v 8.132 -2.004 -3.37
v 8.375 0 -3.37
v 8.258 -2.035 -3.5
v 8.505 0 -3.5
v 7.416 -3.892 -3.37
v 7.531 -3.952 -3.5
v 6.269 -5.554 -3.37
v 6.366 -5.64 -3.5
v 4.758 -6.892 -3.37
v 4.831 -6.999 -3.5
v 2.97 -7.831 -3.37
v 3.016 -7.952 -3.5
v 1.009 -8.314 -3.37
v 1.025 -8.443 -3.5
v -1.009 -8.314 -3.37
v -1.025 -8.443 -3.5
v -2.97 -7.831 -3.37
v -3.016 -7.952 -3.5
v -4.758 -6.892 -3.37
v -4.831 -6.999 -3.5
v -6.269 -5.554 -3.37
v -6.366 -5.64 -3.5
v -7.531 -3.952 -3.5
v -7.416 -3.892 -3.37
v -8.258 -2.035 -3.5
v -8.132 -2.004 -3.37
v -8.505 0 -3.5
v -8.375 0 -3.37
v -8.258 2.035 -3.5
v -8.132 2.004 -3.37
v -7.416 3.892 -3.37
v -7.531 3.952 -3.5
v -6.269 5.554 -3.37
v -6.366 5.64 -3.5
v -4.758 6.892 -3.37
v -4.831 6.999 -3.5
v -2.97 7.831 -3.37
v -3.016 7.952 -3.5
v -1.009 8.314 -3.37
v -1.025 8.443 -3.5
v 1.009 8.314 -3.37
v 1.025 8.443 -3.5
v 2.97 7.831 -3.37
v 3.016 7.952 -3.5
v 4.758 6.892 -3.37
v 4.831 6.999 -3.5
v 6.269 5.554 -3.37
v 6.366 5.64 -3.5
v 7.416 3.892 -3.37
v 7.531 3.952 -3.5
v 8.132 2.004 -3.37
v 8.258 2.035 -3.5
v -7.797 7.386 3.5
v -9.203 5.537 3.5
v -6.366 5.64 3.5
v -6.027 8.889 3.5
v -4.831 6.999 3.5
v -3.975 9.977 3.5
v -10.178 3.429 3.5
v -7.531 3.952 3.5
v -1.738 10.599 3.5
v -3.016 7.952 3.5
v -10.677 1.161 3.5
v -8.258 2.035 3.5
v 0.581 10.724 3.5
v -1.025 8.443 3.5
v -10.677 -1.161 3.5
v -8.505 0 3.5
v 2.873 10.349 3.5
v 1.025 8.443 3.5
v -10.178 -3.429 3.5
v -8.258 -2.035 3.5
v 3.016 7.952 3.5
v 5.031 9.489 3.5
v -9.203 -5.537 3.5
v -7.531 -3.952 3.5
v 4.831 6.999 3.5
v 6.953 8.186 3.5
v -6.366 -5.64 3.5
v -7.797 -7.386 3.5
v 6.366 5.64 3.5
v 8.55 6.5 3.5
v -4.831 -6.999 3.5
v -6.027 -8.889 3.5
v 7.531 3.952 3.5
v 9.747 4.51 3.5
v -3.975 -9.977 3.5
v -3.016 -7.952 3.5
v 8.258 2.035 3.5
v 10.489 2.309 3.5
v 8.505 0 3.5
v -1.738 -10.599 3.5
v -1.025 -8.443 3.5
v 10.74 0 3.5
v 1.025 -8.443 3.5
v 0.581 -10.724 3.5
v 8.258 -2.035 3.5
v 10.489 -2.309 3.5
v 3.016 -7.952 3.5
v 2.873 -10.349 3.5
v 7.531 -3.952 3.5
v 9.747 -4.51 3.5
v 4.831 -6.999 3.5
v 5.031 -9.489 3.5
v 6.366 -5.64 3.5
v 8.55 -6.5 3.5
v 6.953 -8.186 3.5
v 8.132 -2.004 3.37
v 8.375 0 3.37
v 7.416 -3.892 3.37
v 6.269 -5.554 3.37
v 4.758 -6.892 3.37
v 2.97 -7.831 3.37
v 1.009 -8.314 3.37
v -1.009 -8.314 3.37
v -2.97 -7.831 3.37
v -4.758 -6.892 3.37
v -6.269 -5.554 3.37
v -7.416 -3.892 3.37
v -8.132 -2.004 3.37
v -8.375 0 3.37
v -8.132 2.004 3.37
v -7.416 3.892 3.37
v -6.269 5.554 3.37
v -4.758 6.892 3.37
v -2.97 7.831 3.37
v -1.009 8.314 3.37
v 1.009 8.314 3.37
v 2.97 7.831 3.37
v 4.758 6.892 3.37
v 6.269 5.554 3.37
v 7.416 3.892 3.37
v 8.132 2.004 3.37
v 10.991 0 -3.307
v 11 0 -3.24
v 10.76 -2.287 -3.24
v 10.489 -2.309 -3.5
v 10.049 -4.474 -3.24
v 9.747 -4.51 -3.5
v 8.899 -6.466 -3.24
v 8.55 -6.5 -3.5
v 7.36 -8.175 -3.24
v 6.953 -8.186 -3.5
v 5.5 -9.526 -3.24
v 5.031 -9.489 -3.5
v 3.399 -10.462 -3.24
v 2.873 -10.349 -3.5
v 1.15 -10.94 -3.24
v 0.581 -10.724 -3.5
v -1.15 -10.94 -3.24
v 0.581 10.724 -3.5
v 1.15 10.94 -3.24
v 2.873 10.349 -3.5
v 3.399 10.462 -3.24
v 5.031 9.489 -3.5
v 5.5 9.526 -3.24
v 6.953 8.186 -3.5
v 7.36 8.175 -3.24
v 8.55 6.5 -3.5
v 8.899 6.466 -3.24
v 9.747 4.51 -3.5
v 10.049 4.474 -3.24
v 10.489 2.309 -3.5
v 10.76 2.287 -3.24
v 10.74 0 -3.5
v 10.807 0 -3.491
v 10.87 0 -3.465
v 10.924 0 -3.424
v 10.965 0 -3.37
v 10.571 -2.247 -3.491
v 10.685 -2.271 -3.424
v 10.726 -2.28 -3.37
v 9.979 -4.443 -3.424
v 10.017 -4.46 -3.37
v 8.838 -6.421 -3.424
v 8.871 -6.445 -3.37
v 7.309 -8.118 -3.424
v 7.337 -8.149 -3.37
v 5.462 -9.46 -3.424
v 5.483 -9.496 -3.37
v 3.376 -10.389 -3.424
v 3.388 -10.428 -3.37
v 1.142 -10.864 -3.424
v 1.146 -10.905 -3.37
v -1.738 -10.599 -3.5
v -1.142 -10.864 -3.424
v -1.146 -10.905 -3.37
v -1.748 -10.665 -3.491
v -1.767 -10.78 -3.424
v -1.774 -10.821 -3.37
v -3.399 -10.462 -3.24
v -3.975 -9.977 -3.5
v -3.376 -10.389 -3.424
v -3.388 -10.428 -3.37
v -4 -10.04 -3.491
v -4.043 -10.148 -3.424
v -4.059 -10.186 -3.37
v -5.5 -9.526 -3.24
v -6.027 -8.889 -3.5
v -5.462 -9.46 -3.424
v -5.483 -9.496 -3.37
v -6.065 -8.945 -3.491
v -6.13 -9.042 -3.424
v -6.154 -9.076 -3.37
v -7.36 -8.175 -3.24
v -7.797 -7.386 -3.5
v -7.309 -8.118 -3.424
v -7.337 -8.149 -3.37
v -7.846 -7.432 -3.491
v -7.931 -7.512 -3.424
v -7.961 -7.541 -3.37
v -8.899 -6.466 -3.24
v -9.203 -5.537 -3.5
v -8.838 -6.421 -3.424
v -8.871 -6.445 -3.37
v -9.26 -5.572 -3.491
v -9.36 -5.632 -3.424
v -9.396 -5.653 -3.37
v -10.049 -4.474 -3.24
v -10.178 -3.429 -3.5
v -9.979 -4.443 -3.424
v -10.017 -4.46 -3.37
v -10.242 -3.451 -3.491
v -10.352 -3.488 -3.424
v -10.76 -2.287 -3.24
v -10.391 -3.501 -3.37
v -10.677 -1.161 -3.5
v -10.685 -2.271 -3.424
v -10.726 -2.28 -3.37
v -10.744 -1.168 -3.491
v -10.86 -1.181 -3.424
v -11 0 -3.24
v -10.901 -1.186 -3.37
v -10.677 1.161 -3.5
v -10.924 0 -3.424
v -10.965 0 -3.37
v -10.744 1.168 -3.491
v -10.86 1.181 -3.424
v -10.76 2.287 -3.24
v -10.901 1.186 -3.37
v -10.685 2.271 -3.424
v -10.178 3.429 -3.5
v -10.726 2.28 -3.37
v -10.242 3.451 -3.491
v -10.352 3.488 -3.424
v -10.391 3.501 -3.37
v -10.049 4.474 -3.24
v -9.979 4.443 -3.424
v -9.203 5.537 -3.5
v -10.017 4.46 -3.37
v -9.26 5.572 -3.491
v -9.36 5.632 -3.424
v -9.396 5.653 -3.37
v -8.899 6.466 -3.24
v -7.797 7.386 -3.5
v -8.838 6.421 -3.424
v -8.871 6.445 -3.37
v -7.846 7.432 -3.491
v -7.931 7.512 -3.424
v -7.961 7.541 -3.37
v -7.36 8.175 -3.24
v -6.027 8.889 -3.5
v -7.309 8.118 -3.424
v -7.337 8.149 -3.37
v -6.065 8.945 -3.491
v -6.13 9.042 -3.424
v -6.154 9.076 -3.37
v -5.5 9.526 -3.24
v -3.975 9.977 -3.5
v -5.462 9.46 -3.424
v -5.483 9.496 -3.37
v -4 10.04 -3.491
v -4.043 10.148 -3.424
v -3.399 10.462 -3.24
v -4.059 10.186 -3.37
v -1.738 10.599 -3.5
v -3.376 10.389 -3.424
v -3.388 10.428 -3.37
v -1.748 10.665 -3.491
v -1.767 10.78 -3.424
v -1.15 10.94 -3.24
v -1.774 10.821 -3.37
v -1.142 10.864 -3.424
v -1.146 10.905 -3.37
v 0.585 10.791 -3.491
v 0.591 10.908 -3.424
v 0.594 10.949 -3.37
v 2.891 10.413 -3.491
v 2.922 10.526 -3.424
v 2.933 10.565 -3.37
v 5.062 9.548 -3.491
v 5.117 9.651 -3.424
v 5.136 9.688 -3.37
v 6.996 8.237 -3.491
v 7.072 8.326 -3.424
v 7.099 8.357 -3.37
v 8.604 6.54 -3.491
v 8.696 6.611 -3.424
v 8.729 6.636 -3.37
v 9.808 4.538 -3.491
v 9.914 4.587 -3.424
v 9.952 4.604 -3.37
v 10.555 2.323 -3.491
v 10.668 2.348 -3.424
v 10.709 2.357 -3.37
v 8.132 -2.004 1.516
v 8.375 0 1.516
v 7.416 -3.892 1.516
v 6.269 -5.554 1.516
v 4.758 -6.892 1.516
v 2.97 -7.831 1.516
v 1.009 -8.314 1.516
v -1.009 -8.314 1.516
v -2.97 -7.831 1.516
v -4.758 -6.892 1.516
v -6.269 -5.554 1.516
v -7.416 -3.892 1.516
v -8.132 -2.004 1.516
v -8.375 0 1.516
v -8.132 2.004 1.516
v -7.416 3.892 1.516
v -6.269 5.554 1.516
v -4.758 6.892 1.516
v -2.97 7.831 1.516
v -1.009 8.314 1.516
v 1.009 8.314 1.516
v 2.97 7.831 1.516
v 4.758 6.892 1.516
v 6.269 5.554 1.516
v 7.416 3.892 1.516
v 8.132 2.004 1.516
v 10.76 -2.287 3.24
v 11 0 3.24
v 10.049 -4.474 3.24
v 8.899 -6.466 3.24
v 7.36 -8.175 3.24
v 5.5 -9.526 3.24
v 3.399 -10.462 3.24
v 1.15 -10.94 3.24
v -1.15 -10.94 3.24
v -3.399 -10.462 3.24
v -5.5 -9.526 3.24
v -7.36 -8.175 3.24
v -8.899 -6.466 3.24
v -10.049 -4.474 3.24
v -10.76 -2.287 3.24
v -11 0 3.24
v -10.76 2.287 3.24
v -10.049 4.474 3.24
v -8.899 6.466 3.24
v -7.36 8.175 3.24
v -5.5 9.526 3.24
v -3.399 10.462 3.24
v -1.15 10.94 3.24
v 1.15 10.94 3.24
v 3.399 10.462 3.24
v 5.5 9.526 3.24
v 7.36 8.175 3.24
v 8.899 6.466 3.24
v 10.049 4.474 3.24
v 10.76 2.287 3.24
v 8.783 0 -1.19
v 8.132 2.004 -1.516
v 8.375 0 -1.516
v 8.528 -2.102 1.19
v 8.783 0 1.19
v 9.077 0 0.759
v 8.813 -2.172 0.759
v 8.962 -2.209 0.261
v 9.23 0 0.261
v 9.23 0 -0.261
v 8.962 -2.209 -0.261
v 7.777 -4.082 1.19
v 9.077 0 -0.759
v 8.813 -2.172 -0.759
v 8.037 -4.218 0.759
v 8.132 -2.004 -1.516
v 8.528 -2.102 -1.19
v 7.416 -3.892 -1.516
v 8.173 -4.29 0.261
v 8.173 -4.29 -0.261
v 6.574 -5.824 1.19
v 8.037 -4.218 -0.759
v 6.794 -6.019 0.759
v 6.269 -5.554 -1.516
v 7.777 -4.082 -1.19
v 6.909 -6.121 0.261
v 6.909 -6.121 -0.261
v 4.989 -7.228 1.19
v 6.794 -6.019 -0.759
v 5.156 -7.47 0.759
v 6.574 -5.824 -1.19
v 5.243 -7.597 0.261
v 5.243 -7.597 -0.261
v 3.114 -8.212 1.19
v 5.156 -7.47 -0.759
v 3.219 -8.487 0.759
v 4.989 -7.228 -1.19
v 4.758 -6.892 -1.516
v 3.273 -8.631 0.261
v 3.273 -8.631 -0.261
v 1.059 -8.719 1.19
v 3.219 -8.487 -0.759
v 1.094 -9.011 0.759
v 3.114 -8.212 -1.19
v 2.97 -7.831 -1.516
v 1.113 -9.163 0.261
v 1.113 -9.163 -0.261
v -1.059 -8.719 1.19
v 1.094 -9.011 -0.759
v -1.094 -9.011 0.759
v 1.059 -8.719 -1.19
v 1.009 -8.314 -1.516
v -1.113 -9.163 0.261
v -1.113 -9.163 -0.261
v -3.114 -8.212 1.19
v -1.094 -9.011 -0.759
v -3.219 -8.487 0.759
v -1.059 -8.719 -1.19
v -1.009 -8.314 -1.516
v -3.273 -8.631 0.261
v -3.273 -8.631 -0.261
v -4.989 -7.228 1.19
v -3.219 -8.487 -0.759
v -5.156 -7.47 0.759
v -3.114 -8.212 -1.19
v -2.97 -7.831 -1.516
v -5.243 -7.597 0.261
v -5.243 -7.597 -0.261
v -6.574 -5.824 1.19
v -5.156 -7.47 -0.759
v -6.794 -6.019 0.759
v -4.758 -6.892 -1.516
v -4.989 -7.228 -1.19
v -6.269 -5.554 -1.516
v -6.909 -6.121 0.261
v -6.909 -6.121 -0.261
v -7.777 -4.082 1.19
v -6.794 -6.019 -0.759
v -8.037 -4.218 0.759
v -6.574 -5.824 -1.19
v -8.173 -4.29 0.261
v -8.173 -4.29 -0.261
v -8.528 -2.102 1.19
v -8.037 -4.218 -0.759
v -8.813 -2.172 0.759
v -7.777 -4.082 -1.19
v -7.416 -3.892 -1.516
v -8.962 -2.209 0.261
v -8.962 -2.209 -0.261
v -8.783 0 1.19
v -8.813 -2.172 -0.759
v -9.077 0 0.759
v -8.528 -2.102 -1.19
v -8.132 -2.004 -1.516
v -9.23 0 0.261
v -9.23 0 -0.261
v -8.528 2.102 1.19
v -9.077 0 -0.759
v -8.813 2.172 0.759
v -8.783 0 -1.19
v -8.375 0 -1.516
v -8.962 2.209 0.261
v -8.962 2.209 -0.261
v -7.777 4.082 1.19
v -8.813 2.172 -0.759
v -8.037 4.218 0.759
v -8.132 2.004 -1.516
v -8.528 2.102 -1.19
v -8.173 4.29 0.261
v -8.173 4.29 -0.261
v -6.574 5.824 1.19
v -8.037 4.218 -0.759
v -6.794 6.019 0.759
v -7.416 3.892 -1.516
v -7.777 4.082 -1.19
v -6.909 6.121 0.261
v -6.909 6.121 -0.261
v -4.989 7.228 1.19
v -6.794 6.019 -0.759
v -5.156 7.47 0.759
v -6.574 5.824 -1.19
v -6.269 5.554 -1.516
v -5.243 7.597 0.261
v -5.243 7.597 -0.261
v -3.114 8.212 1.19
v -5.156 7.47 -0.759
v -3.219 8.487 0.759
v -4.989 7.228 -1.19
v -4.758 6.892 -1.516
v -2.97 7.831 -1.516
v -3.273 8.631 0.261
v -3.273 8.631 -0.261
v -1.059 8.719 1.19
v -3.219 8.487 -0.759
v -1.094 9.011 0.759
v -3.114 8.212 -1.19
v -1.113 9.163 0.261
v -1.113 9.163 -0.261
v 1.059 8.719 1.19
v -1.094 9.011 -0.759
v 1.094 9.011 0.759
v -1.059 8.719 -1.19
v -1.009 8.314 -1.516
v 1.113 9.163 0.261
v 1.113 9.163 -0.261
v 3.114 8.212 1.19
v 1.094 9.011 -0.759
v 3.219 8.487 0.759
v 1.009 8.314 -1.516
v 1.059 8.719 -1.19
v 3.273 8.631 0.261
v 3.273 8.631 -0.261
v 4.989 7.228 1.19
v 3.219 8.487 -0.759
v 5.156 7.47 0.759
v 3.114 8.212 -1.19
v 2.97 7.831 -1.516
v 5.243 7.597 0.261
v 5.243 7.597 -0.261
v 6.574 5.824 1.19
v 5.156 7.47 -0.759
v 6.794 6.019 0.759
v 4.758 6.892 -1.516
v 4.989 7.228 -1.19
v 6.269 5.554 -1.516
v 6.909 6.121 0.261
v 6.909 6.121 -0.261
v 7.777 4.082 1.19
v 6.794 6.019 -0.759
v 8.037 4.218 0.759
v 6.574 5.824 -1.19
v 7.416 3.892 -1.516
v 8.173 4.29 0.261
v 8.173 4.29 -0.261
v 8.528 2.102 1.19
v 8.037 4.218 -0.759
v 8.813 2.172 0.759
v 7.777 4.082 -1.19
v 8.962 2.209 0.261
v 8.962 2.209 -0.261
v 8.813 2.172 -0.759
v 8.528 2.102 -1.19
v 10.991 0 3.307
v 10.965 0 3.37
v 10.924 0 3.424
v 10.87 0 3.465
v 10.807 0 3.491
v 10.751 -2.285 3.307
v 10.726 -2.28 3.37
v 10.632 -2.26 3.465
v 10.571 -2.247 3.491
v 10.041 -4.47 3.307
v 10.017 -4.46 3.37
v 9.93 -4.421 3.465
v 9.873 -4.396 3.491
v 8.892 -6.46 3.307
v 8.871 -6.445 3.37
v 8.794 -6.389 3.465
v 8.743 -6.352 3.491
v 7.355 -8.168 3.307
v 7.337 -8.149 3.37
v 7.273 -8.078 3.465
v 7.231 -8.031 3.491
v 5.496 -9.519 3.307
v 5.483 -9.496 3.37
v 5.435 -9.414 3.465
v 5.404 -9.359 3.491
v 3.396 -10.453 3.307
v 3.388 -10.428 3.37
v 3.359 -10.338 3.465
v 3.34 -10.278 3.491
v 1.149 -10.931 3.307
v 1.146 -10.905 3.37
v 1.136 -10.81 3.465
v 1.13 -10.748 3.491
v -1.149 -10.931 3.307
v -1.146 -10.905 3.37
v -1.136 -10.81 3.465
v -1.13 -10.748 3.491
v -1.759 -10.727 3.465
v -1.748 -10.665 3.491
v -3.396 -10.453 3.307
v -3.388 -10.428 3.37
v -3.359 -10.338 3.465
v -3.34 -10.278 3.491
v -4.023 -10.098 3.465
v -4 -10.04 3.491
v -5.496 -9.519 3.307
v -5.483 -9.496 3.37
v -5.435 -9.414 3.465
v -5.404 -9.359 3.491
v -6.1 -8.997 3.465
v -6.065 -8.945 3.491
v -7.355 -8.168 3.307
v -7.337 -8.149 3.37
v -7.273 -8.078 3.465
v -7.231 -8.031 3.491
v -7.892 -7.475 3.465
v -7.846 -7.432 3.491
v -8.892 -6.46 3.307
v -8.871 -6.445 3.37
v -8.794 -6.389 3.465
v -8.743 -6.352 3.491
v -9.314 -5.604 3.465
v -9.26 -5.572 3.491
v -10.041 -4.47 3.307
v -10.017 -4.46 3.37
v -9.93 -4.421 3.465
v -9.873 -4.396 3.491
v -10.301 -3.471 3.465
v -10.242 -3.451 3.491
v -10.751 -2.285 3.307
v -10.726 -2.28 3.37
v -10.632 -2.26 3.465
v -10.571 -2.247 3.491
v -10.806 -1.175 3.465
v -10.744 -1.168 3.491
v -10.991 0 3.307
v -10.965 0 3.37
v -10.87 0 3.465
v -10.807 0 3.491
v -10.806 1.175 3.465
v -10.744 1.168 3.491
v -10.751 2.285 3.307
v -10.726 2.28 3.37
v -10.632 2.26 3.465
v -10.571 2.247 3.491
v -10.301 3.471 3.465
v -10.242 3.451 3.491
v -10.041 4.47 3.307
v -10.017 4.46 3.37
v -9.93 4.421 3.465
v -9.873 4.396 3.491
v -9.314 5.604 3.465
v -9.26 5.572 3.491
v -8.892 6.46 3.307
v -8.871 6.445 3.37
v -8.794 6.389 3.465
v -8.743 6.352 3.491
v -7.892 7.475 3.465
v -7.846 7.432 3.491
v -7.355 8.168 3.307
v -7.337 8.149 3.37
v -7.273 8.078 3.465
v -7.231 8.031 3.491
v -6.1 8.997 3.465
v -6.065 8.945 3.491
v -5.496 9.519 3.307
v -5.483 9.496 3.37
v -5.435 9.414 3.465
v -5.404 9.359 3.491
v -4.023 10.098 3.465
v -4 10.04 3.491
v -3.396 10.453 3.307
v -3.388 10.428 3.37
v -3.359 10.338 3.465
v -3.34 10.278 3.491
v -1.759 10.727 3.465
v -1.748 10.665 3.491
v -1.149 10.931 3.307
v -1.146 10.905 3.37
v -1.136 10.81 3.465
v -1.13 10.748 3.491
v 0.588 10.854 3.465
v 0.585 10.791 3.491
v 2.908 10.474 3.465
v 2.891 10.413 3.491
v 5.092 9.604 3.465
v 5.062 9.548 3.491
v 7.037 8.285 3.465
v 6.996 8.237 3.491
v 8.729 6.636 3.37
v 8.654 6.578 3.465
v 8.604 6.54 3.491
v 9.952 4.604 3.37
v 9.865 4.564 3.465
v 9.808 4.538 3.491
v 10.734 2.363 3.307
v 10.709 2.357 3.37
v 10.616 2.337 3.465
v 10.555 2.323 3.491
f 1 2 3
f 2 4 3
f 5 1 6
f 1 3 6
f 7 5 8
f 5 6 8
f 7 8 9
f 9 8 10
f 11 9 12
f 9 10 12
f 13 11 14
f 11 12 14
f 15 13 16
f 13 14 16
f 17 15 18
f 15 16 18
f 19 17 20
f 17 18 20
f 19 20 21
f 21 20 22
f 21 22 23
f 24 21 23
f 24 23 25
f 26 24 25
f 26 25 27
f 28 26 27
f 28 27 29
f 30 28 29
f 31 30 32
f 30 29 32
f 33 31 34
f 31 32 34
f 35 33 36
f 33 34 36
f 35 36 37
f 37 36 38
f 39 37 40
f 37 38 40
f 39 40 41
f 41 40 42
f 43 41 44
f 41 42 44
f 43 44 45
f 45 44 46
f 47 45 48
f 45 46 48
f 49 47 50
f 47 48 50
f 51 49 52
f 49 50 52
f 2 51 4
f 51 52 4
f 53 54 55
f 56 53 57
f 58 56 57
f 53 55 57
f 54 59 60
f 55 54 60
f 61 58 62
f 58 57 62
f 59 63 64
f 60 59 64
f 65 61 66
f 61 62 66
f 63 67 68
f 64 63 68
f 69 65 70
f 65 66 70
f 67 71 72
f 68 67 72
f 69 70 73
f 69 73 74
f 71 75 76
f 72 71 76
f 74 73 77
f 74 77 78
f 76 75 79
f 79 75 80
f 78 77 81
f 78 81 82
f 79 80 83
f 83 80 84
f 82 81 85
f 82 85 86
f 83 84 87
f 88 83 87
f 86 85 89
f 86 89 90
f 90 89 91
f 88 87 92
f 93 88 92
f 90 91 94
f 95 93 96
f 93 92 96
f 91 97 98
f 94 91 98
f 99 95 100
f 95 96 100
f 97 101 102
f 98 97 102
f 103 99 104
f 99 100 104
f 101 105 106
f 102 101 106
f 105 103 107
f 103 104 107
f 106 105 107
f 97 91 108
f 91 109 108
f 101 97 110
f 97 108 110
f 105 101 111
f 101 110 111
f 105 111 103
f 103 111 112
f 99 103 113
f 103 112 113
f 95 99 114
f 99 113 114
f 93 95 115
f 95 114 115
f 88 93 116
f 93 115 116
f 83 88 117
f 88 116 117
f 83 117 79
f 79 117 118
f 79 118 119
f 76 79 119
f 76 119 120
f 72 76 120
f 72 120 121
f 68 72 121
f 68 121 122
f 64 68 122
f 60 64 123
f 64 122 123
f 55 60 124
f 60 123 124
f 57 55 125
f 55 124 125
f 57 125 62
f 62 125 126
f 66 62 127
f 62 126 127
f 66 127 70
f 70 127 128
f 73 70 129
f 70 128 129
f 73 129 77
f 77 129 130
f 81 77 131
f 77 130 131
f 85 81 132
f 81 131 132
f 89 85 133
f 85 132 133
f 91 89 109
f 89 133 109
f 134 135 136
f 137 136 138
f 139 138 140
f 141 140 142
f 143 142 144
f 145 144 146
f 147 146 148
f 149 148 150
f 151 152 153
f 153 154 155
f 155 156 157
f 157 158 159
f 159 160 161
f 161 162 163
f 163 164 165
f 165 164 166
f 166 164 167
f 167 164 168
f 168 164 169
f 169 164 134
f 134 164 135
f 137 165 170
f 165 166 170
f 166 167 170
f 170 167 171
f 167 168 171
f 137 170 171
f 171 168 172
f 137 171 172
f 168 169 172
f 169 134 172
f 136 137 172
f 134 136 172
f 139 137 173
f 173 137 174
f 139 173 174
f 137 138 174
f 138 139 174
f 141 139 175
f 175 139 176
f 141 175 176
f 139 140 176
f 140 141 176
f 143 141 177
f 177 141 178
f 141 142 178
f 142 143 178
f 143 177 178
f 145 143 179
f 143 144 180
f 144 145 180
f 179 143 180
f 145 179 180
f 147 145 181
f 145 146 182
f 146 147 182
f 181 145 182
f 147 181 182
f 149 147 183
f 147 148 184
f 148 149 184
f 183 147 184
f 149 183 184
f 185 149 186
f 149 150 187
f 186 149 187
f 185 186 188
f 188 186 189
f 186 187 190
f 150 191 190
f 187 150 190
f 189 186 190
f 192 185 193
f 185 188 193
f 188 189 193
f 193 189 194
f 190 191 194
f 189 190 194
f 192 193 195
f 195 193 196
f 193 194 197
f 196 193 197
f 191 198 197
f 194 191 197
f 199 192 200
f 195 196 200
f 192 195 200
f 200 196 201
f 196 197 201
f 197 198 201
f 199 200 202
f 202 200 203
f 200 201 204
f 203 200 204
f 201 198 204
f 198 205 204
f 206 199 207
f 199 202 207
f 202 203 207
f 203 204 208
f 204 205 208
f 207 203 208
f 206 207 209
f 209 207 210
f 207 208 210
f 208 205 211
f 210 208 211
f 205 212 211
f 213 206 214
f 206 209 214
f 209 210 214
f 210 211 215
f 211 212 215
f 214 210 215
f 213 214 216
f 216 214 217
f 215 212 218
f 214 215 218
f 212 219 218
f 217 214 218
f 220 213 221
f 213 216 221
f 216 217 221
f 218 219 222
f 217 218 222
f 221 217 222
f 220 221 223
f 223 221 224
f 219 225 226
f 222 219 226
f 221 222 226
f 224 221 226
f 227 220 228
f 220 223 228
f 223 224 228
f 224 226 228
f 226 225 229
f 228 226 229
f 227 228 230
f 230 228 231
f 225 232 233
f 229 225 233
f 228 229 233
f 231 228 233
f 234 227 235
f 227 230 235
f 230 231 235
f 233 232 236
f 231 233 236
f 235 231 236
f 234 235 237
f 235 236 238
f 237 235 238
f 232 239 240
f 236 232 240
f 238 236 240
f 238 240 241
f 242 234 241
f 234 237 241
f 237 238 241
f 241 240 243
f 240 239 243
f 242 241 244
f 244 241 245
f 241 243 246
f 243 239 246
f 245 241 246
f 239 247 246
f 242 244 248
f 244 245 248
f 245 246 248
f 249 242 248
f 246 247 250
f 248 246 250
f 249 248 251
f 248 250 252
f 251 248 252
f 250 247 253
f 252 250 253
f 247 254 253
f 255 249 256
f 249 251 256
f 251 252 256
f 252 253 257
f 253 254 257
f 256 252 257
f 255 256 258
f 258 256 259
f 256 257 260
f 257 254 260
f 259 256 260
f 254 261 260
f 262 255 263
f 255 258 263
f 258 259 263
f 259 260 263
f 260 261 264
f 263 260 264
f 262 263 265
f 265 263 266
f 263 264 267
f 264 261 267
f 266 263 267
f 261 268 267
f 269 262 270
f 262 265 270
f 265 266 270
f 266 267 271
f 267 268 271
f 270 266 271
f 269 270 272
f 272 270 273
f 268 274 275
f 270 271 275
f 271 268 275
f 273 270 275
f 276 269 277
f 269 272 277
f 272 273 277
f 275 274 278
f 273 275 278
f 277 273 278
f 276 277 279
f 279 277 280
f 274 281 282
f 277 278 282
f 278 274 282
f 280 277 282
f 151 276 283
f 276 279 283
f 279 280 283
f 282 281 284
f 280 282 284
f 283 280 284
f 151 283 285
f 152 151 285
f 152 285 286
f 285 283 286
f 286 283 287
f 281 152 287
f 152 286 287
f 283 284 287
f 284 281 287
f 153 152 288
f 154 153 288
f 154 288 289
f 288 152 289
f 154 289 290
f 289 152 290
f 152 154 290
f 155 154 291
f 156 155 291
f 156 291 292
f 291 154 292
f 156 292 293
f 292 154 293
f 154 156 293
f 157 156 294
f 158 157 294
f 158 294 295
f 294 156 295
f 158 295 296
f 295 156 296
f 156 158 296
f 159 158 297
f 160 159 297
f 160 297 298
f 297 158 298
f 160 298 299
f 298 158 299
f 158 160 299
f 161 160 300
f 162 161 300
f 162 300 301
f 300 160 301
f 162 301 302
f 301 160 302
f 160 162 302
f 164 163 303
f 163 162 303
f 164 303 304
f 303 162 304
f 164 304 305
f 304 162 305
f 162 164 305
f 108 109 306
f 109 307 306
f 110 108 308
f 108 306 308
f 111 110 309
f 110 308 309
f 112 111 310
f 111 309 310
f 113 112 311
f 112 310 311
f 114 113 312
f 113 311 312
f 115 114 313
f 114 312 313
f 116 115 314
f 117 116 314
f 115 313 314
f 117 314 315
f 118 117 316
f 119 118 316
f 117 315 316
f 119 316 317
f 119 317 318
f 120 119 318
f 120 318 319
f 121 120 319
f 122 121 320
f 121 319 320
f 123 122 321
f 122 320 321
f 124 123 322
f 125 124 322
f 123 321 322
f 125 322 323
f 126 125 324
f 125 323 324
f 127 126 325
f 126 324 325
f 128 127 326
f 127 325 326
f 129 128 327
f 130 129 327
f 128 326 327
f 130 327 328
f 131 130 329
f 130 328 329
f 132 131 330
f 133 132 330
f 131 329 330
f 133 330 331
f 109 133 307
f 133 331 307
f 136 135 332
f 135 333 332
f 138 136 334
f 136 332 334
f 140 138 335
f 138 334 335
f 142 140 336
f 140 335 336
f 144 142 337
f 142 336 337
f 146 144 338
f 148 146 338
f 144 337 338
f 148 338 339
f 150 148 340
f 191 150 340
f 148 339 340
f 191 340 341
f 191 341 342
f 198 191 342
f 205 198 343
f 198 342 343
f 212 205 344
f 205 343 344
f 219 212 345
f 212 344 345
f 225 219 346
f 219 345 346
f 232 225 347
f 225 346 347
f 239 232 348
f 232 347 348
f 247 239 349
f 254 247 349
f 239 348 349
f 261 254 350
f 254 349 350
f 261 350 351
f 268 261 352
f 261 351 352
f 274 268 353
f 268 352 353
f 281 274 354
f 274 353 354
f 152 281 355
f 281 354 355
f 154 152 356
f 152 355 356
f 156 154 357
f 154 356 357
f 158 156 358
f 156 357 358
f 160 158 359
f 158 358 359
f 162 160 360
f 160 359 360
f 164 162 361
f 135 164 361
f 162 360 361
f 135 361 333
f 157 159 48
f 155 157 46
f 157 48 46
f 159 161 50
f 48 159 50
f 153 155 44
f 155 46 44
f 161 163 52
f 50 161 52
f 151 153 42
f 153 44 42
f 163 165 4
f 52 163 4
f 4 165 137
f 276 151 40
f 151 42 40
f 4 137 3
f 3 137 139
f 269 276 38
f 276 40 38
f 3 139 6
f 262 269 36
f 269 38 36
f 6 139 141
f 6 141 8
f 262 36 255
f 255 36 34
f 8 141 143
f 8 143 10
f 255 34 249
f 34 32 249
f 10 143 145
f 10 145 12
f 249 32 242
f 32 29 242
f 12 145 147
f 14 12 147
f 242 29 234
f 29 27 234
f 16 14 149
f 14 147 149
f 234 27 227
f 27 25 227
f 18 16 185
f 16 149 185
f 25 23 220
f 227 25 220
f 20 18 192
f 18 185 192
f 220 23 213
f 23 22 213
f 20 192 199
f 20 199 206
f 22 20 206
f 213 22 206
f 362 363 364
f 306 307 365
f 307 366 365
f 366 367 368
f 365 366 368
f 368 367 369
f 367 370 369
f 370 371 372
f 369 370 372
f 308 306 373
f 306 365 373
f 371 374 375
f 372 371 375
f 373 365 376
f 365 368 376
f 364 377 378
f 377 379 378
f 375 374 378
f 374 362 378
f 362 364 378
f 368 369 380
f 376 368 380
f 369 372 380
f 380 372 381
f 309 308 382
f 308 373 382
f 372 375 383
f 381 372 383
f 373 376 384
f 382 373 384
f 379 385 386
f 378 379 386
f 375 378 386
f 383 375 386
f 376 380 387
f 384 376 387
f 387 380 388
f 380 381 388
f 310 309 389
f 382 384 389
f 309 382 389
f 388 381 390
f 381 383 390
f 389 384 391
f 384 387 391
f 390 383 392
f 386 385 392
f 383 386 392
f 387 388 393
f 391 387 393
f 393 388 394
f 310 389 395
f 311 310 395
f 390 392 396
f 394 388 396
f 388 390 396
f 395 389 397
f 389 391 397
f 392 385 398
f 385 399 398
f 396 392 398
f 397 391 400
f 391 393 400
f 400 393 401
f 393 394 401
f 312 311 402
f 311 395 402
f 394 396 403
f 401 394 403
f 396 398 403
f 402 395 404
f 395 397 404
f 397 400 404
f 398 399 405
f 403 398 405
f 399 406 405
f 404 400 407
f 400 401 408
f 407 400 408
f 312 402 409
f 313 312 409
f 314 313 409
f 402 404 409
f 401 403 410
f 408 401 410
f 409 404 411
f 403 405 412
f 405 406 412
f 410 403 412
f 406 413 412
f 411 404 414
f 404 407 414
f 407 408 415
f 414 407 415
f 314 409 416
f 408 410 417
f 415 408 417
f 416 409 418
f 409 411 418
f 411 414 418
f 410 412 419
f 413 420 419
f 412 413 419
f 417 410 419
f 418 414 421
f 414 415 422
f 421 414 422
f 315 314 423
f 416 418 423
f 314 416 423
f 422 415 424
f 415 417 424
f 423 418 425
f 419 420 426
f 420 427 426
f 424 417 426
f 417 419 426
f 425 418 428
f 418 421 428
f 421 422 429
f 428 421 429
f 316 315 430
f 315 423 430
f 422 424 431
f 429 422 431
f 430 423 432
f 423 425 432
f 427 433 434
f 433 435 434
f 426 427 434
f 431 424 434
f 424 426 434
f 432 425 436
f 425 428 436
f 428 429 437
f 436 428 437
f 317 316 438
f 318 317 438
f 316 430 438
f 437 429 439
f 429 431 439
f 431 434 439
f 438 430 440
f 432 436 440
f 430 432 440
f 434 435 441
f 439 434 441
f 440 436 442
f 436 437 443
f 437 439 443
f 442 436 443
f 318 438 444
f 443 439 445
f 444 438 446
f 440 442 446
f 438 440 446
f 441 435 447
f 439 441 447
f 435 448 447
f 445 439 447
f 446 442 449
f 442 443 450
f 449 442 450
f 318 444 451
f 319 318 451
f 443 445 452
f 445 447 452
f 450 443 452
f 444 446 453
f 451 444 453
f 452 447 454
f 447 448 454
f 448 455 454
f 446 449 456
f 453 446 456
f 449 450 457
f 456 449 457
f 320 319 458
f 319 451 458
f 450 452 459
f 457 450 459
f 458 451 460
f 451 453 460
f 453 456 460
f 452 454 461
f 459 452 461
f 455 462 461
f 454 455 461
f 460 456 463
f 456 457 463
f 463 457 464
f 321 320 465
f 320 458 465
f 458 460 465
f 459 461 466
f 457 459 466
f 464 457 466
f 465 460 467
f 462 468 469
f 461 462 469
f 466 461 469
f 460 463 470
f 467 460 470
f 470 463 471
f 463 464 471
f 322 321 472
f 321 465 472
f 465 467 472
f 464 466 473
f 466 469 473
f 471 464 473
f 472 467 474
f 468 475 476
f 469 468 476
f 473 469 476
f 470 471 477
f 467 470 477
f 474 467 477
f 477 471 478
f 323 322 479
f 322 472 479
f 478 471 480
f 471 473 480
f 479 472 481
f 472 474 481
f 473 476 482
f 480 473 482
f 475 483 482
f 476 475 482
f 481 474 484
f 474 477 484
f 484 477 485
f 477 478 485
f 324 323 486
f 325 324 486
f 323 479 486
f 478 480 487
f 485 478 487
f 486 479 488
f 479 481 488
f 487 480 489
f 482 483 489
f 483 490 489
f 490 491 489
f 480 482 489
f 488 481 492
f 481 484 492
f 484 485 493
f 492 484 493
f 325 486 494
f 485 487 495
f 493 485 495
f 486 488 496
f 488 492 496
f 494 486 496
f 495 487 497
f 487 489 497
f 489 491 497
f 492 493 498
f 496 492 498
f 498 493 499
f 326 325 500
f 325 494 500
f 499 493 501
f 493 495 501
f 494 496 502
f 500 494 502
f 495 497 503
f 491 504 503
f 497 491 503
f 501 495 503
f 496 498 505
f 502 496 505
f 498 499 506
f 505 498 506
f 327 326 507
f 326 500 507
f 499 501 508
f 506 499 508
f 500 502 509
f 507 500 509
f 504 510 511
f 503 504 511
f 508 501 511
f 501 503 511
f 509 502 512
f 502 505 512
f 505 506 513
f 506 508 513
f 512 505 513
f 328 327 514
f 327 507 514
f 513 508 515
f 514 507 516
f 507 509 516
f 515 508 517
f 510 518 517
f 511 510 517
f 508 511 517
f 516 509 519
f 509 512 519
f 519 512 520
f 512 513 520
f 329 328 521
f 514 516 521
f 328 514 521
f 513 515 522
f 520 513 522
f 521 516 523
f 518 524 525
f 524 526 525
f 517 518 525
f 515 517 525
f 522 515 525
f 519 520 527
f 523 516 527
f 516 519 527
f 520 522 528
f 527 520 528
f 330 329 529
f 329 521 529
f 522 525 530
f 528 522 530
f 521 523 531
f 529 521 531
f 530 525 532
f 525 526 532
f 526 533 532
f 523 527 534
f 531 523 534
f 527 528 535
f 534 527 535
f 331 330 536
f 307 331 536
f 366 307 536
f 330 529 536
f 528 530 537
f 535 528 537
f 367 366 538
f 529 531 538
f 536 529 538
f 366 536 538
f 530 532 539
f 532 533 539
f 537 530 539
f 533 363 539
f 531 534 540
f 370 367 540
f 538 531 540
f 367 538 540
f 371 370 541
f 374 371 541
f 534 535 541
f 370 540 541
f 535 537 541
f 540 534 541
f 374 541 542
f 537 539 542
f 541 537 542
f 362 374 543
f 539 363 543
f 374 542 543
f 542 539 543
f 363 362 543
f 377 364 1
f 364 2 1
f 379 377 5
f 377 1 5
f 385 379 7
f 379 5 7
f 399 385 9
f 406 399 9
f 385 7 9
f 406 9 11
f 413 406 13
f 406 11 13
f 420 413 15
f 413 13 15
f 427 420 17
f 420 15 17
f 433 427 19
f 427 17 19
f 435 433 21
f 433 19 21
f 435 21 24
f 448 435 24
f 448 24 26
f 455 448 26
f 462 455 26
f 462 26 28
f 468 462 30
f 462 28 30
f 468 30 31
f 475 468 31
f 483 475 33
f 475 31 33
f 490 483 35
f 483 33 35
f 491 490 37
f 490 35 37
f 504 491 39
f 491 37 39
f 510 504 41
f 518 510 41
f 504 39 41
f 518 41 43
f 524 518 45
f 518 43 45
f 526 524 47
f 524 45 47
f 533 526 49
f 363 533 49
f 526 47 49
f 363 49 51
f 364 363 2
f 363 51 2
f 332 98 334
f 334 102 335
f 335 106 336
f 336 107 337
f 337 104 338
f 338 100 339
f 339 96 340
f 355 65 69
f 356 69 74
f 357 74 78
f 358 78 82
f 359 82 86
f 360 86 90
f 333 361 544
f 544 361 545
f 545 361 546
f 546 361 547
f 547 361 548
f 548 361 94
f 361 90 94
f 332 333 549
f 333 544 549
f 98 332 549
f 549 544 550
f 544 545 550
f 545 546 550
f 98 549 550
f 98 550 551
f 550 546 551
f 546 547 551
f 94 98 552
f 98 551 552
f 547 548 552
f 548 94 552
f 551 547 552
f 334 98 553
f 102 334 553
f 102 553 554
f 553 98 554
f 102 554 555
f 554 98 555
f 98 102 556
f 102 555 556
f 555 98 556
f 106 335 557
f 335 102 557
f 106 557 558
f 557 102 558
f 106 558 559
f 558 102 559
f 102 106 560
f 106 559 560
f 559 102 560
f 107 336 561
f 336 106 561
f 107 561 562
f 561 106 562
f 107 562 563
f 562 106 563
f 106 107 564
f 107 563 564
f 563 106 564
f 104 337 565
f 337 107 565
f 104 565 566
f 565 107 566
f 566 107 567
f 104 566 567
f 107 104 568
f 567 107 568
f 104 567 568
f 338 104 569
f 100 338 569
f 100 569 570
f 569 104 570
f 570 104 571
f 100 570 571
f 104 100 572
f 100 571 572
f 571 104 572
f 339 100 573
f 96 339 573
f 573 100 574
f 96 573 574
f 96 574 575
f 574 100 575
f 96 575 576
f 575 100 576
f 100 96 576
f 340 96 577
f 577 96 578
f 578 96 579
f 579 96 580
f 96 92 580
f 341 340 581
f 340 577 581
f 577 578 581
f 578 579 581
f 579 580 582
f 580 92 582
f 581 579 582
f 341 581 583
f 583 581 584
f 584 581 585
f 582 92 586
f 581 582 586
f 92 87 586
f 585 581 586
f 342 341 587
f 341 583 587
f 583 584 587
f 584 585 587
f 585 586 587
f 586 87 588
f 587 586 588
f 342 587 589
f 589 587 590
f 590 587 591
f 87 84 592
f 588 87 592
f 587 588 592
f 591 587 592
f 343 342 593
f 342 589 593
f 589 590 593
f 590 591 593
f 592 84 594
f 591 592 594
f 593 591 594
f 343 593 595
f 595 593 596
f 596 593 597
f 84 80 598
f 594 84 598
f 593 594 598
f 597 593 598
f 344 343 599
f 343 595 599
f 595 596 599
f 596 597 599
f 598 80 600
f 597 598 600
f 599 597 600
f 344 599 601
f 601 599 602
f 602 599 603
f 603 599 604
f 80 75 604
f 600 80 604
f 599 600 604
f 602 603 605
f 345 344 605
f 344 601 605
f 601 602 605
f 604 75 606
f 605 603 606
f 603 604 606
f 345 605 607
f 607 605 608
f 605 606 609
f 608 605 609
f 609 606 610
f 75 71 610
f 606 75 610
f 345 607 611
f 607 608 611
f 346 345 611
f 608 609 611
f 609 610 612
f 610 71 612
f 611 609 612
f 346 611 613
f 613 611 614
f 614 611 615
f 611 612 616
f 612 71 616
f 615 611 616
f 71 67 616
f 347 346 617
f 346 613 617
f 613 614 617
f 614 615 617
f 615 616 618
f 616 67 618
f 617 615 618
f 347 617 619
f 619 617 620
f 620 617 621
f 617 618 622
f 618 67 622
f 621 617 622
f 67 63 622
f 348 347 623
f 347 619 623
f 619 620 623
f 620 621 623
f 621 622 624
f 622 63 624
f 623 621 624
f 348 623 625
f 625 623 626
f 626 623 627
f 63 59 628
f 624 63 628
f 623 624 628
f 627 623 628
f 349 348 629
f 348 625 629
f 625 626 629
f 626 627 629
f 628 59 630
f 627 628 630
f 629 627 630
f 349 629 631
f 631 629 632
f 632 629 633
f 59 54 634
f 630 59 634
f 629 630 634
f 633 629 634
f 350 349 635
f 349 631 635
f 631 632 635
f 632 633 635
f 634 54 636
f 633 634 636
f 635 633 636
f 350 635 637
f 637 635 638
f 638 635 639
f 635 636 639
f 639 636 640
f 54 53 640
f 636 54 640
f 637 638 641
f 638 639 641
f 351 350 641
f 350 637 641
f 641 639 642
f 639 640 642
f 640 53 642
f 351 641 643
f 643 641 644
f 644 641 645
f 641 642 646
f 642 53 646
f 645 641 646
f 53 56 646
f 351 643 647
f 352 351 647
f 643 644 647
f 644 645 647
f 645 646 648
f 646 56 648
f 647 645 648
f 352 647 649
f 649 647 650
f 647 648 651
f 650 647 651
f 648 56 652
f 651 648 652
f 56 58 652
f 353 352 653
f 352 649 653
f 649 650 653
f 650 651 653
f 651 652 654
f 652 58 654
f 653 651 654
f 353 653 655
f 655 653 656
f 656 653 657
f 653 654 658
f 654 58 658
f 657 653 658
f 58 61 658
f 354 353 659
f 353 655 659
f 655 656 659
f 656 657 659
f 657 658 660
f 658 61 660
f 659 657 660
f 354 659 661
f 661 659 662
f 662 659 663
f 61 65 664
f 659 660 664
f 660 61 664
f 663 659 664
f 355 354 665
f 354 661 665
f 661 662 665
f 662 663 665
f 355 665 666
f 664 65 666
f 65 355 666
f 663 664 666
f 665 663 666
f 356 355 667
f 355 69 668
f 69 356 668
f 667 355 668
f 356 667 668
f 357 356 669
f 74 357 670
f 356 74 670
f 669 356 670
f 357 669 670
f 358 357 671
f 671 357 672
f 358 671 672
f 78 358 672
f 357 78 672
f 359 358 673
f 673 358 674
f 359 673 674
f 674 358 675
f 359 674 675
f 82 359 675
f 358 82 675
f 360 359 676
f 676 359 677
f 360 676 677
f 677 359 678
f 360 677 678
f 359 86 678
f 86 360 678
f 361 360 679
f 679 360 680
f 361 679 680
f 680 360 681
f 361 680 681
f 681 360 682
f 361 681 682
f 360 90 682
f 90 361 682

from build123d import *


with BuildPart() as part:
    # Sketch1 → Revolve1 (revolve)
    with BuildSketch(Plane(origin=(0, 0, 0), x_dir=(0, 0, -1), z_dir=(1, 0, 0)), mode=Mode.PRIVATE) as revolve1_sk:
        with BuildLine():
            Line((-3.37, 8.375), (-1.515544457, 8.375))
            ThreePointArc((-1.515544457, 8.375), (0, 9.25), (1.515544457, 8.375))
            Line((1.515544457, 8.375), (3.37, 8.375))
            Line((3.37, 8.375), (3.5, 8.505))
            Line((3.5, 8.505), (3.5, 10.74))
            ThreePointArc((3.5, 10.74), (3.423847763, 10.923847763), (3.24, 11))
            Line((3.24, 11), (-3.24, 11))
            ThreePointArc((-3.24, 11), (-3.423847763, 10.923847763), (-3.5, 10.74))
            Line((-3.5, 10.74), (-3.5, 8.505))
            Line((-3.5, 8.505), (-3.37, 8.375))
        make_face()
    revolve(revolve1_sk.sketch.rotate(Axis((0, 0, 3.5), (0, 0, -1)), 90), axis=Axis((0, 0, 3.5), (0, 0, -1)))


solid = part.part
